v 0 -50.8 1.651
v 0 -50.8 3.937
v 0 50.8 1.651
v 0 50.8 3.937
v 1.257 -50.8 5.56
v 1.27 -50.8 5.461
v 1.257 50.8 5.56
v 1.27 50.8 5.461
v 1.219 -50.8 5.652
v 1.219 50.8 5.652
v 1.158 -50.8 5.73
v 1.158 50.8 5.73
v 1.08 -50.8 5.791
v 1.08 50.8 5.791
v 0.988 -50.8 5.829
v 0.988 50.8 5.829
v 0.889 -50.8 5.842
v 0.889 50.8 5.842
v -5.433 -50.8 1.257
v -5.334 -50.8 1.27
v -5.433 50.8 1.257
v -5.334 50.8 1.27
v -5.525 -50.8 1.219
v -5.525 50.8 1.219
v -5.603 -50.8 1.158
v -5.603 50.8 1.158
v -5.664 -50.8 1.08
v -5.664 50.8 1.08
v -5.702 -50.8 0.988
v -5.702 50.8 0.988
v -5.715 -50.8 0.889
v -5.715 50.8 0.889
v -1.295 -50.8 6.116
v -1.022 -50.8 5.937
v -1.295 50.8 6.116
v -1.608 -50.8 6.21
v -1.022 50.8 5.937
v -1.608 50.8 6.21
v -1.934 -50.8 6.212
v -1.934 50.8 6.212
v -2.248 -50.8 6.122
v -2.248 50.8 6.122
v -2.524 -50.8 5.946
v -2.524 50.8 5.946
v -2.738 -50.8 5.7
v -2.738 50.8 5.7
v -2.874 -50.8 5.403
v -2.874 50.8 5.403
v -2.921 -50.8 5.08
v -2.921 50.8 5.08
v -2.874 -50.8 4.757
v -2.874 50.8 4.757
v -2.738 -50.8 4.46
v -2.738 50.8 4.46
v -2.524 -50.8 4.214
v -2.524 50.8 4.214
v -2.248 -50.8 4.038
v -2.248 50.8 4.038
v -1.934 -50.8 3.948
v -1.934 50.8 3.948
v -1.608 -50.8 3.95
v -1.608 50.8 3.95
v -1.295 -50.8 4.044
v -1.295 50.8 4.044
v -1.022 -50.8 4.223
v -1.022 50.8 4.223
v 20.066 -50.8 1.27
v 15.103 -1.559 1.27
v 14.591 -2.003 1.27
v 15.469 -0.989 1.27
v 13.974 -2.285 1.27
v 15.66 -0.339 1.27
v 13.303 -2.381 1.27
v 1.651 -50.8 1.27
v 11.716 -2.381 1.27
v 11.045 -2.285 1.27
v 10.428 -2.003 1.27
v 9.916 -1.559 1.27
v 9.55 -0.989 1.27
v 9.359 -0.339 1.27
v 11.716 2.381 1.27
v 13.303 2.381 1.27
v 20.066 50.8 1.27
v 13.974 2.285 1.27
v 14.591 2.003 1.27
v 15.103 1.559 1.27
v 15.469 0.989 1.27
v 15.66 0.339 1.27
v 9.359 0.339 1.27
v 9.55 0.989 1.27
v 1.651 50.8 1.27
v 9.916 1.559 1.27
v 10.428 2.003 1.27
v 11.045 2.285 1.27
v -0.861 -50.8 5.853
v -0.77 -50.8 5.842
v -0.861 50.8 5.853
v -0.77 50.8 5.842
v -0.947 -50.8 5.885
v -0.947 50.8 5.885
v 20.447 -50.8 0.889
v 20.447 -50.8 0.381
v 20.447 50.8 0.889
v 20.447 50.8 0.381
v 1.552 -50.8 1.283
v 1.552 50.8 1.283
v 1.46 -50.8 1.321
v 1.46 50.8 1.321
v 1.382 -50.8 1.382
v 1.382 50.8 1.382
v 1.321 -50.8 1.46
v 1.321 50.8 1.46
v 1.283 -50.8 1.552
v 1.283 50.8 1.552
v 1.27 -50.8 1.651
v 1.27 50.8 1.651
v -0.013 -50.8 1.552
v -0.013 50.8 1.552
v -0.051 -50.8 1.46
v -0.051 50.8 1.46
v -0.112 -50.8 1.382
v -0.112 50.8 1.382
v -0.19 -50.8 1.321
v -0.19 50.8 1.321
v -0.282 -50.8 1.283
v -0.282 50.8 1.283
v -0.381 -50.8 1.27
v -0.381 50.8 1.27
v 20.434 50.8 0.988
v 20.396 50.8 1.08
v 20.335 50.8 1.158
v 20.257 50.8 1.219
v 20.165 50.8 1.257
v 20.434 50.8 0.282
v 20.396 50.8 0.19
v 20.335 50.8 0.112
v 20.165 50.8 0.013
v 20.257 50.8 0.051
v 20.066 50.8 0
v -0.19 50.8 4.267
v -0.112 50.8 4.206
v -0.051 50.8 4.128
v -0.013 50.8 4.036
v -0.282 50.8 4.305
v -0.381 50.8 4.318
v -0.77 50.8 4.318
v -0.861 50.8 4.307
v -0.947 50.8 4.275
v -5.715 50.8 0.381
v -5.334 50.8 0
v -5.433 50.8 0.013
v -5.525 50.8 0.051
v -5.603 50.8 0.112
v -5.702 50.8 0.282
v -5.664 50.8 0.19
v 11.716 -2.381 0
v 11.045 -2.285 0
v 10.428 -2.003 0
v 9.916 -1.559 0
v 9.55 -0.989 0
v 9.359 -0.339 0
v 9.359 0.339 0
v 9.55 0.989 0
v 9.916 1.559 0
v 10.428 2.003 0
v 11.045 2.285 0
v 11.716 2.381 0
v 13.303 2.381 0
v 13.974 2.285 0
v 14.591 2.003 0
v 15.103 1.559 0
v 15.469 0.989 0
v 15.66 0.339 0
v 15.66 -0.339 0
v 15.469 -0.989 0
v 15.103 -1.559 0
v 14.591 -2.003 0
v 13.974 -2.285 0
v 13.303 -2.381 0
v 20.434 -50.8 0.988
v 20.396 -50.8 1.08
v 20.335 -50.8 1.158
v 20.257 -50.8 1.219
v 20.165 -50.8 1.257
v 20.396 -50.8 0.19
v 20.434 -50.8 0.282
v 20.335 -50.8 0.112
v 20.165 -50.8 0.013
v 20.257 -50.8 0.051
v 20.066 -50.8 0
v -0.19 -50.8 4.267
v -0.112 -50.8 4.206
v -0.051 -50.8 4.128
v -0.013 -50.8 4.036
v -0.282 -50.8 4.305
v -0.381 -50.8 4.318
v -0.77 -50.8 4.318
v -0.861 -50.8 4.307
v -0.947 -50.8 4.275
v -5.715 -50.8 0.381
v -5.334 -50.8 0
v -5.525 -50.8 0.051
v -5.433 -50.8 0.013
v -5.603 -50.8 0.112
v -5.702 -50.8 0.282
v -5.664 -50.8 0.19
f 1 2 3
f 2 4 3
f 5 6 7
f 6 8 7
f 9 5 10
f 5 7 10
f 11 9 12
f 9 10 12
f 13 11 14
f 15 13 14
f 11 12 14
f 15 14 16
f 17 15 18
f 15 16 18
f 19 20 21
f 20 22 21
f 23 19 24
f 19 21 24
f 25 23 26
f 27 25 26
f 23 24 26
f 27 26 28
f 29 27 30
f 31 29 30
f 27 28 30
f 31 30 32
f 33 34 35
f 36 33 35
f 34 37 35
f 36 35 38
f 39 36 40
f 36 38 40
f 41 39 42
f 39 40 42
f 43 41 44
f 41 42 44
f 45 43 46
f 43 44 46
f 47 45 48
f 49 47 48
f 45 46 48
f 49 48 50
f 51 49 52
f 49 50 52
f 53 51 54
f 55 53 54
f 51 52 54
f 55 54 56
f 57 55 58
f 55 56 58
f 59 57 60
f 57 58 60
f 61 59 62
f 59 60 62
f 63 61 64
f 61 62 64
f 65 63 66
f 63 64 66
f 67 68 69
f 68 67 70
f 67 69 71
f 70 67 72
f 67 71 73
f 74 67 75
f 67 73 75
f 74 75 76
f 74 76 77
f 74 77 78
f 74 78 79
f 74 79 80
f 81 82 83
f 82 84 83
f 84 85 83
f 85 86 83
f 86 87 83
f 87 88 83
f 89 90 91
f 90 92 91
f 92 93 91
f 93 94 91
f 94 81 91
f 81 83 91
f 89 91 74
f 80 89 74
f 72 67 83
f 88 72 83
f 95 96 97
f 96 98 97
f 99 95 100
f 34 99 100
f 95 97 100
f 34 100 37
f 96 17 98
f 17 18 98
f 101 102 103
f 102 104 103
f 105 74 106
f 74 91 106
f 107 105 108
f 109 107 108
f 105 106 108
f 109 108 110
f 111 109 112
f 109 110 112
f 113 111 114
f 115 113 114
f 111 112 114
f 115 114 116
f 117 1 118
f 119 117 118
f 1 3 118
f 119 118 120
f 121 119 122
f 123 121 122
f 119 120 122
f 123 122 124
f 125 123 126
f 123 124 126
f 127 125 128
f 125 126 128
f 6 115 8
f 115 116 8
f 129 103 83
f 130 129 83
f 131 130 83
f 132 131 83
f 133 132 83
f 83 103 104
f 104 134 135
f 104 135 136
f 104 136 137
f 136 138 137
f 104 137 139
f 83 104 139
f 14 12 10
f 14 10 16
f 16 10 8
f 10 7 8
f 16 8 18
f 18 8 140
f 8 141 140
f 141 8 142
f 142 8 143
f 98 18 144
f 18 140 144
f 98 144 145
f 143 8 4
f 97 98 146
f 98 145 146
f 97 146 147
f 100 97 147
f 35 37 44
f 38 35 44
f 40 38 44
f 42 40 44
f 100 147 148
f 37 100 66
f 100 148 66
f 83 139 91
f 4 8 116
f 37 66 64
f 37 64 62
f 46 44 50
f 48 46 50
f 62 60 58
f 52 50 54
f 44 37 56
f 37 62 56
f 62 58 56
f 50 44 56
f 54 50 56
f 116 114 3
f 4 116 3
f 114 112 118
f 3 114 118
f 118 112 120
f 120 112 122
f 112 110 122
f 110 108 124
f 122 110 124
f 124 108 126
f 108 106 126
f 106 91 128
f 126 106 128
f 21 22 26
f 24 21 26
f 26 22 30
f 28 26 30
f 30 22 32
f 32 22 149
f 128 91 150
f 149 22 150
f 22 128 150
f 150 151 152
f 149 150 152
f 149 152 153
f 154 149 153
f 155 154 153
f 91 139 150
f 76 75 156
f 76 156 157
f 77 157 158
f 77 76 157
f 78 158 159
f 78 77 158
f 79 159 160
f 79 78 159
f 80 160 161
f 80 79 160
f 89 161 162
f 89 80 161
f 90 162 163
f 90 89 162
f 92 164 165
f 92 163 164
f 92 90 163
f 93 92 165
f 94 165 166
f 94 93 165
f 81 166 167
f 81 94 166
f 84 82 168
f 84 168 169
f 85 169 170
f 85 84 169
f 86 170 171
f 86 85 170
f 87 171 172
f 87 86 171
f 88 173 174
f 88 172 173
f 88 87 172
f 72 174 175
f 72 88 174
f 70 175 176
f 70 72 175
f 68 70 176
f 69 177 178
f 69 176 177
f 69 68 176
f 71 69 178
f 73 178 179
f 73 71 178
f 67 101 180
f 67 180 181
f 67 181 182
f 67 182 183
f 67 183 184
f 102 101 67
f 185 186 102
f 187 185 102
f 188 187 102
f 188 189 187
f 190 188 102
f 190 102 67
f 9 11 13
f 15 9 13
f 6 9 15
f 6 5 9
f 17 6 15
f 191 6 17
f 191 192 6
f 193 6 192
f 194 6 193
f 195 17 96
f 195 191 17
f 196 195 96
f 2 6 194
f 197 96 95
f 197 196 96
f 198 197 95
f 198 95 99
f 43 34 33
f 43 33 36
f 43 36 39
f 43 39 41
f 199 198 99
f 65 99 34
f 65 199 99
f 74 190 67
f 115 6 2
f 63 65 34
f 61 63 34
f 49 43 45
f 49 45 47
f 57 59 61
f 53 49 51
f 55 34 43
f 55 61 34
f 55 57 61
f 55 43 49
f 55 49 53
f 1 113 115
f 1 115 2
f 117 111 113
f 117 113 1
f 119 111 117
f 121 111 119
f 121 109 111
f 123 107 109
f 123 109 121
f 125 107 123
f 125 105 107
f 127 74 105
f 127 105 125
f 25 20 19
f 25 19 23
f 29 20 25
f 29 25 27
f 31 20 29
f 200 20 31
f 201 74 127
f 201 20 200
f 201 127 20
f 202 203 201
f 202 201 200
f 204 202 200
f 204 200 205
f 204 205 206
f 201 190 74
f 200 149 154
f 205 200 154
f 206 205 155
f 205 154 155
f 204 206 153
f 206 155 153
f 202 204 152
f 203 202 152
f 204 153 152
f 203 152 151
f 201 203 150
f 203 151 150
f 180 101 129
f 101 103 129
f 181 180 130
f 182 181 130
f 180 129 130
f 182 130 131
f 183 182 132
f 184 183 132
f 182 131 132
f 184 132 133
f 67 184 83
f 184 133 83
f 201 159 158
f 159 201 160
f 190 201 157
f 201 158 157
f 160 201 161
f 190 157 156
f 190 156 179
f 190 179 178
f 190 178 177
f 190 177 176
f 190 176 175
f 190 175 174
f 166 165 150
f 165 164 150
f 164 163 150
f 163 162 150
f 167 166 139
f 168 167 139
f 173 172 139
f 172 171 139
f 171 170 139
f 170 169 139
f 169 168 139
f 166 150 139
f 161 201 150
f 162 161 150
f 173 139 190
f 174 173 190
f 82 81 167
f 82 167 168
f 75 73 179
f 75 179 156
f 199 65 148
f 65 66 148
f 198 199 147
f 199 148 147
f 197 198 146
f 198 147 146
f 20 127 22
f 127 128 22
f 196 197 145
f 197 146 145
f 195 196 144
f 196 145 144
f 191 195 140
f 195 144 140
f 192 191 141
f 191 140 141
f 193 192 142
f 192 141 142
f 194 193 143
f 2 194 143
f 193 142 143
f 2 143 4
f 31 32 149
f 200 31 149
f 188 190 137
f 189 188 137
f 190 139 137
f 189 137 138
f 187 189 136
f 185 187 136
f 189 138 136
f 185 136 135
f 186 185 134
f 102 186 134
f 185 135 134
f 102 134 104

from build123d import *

# Parameters (mm, degrees)
BOSS_EXTRUDE1_DEPTH = 50.8
CUT_EXTRUDE1_DEPTH  = 2.27


with BuildPart() as part:
    # Sketch2 → Boss-Extrude1 (new body, symmetric)
    with BuildSketch(Plane(origin=(0, 0, 0), x_dir=(1, 0, 0), z_dir=(0, 1, 0))):
        with BuildLine():
            Line((-5.334, 0), (20.066, 0))
            ThreePointArc((20.066, 0), (20.335407684, -0.111592316), (20.447, -0.381))
            Line((20.447, -0.381), (20.447, -0.889))
            ThreePointArc((20.447, -0.889), (20.335407684, -1.158407684), (20.066, -1.27))
            Line((20.066, -1.27), (1.651, -1.27))
            ThreePointArc((1.651, -1.27), (1.381592316, -1.381592316), (1.27, -1.651))
            Line((1.27, -1.651), (1.27, -5.461))
            ThreePointArc((1.27, -5.461), (1.158407684, -5.730407684), (0.889, -5.842))
            Line((0.889, -5.842), (-0.76996875, -5.842))
            ThreePointArc((-0.76996875, -5.842), (-0.904672592, -5.866607134), (-1.021976563, -5.93725))
            ThreePointArc((-1.021976563, -5.93725), (-2.921, -5.08), (-1.021976563, -4.22275))
            ThreePointArc((-1.021976563, -4.22275), (-0.904672592, -4.293392866), (-0.76996875, -4.318))
            Line((-0.76996875, -4.318), (-0.381, -4.318))
            ThreePointArc((-0.381, -4.318), (-0.111592316, -4.206407684), (0, -3.937))
            Line((0, -3.937), (0, -1.651))
            ThreePointArc((0, -1.651), (-0.111592316, -1.381592316), (-0.381, -1.27))
            Line((-0.381, -1.27), (-5.334, -1.27))
            ThreePointArc((-5.334, -1.27), (-5.603407684, -1.158407684), (-5.715, -0.889))
            Line((-5.715, -0.889), (-5.715, -0.381))
            ThreePointArc((-5.715, -0.381), (-5.603407684, -0.111592316), (-5.334, 0))
        make_face()
    extrude(amount=BOSS_EXTRUDE1_DEPTH, both=True)

    # Sketch3 → Cut-Extrude1 (cut, through all)
    with BuildSketch(Plane.XY.offset(1.27)):
        with BuildLine():
            Line((11.71575, 2.38125), (13.30325, 2.38125))
            ThreePointArc((13.30325, 2.38125), (15.6845, 0), (13.30325, -2.38125))
            Line((13.30325, -2.38125), (11.71575, -2.38125))
            ThreePointArc((11.71575, -2.38125), (9.3345, 0), (11.71575, 2.38125))
        make_face()
    extrude(amount=-CUT_EXTRUDE1_DEPTH, mode=Mode.SUBTRACT)


solid = part.part
